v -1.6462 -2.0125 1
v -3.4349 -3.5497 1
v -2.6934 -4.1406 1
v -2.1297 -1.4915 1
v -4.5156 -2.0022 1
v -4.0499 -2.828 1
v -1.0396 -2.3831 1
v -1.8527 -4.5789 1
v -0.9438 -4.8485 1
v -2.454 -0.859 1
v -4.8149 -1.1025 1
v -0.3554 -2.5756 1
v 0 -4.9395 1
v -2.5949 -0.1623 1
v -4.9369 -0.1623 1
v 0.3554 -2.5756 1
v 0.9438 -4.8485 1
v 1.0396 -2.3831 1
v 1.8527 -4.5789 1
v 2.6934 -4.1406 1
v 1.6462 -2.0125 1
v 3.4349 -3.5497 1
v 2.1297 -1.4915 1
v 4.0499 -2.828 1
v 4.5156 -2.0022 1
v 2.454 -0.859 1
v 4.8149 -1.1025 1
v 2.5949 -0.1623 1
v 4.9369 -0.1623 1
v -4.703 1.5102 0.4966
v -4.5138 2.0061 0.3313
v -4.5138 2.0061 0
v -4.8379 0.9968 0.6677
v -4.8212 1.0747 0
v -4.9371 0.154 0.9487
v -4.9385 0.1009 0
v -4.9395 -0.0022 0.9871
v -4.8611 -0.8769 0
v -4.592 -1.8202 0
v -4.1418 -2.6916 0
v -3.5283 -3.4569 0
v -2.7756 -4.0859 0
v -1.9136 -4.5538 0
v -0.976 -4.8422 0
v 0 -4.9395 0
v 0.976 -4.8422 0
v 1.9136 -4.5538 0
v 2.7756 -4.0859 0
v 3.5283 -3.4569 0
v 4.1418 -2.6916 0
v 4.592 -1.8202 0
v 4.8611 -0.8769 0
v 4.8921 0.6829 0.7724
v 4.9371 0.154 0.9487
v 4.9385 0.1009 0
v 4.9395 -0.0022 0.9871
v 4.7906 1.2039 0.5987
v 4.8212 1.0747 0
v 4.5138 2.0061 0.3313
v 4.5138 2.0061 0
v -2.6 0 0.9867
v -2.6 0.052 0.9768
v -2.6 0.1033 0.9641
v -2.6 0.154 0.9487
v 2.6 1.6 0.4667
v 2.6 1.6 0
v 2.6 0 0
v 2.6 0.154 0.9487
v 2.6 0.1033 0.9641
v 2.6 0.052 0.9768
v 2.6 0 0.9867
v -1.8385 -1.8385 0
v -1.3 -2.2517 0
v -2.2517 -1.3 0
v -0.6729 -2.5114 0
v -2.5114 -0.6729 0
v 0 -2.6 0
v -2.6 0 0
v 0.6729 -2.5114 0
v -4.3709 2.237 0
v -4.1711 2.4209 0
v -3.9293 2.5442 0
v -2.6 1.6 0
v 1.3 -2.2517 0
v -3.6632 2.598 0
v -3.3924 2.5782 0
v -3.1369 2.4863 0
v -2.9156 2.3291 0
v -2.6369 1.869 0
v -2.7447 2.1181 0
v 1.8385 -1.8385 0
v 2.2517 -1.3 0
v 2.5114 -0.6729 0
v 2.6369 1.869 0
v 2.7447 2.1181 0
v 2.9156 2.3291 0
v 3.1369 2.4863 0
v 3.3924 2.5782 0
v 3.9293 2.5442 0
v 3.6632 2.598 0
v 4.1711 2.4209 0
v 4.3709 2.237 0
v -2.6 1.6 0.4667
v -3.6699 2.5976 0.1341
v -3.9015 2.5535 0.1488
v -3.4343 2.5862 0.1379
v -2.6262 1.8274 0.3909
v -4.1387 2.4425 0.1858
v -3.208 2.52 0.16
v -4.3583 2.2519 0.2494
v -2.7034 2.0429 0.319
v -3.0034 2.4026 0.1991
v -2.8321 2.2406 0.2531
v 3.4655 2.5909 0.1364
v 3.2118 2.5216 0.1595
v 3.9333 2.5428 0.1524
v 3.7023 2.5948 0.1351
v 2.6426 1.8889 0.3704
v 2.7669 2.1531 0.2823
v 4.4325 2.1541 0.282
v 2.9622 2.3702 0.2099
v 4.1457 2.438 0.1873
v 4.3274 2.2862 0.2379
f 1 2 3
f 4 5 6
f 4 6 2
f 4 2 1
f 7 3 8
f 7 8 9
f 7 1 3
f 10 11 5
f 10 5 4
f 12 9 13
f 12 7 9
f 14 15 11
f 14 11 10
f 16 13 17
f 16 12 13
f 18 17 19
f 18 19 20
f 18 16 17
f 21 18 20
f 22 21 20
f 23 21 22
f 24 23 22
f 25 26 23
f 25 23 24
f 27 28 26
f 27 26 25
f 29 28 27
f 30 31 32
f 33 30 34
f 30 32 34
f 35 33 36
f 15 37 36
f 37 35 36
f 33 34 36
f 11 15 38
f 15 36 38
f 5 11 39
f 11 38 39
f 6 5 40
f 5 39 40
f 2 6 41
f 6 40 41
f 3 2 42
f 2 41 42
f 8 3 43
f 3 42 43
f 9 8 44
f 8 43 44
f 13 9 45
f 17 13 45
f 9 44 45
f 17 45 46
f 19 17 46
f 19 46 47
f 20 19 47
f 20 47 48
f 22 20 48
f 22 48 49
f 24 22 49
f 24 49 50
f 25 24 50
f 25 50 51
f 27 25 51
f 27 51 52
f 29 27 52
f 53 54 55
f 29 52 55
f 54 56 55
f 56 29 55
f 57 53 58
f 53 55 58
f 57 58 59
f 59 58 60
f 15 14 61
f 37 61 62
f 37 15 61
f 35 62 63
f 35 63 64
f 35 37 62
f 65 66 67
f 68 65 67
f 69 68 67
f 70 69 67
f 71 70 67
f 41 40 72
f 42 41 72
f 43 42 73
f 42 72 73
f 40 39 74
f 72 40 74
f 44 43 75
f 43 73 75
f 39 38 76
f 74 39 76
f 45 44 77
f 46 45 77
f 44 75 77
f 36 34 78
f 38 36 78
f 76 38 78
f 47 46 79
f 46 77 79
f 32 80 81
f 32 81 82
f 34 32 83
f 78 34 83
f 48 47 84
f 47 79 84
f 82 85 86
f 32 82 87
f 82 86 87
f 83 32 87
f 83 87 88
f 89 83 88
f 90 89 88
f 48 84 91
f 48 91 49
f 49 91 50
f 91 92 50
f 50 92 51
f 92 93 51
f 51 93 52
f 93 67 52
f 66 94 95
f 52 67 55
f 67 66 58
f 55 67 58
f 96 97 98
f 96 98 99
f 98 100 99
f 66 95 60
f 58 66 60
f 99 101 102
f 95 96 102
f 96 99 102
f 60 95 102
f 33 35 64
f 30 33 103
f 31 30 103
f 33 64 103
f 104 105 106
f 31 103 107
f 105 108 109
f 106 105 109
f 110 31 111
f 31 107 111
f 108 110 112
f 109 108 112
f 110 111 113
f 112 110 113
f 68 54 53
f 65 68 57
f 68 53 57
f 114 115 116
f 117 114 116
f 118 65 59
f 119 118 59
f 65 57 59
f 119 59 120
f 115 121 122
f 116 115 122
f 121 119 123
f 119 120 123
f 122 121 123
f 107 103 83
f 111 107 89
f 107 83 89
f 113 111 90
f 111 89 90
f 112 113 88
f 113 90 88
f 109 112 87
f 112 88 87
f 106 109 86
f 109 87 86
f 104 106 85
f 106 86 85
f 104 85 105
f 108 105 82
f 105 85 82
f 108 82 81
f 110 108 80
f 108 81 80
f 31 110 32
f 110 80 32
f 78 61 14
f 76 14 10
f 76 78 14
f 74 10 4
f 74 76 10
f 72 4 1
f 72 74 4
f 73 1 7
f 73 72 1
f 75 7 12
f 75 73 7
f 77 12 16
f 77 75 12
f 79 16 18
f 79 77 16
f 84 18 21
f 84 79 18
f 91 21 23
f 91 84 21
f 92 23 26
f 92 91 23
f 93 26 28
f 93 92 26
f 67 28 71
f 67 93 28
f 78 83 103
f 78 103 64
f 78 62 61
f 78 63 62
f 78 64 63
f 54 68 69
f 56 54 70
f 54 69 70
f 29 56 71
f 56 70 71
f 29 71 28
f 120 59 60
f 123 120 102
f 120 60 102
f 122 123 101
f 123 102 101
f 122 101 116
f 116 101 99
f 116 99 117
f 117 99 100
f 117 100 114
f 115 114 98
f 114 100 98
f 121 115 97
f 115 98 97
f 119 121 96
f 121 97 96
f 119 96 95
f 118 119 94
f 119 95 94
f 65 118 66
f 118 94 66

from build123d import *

# Parameters (mm, degrees)
PAD001_DEPTH = 5
PAD_DEPTH    = 1
FILLET_R     = 1


with BuildPart() as pad001:
    # Sketch001 → Pad001 (new body, symmetric)
    with BuildSketch(Plane.YZ):
        Polygon((0, 1), (3, 0), (3, 1), align=None)
    extrude(amount=PAD001_DEPTH, both=True)


with BuildPart() as fillet_body:
    # Sketch → Pad (new body)
    with BuildSketch(Plane.XY):
        with BuildLine():
            ThreePointArc((-4.513812, 2.006138), (4e-06, -4.939543), (4.513808, 2.006146))
            ThreePointArc((4.513808, 2.006146), (3.392408, 2.578216), (2.6, 1.600007))
            Line((2.6, 1.600007), (2.6, 0))
            ThreePointArc((-2.6, 0), (0, -2.6), (2.6, 0))
            Line((-2.6, 1.599999), (-2.6, 0))
            ThreePointArc((-2.6, 1.599999), (-3.392408, 2.578216), (-4.513812, 2.006138))
        make_face()
    extrude(amount=PAD_DEPTH)

    # Cut: cut Pad001
    add(pad001.part, mode=Mode.SUBTRACT)

    # Fillet
    fillet_edges = [fillet_body.edges().sort_by_distance(p)[0] for p in [
        (3.769772, 0, 1),
        (-3.769772, 0, 1),
    ]]
    fillet(fillet_edges, radius=FILLET_R)


solid = fillet_body.part
